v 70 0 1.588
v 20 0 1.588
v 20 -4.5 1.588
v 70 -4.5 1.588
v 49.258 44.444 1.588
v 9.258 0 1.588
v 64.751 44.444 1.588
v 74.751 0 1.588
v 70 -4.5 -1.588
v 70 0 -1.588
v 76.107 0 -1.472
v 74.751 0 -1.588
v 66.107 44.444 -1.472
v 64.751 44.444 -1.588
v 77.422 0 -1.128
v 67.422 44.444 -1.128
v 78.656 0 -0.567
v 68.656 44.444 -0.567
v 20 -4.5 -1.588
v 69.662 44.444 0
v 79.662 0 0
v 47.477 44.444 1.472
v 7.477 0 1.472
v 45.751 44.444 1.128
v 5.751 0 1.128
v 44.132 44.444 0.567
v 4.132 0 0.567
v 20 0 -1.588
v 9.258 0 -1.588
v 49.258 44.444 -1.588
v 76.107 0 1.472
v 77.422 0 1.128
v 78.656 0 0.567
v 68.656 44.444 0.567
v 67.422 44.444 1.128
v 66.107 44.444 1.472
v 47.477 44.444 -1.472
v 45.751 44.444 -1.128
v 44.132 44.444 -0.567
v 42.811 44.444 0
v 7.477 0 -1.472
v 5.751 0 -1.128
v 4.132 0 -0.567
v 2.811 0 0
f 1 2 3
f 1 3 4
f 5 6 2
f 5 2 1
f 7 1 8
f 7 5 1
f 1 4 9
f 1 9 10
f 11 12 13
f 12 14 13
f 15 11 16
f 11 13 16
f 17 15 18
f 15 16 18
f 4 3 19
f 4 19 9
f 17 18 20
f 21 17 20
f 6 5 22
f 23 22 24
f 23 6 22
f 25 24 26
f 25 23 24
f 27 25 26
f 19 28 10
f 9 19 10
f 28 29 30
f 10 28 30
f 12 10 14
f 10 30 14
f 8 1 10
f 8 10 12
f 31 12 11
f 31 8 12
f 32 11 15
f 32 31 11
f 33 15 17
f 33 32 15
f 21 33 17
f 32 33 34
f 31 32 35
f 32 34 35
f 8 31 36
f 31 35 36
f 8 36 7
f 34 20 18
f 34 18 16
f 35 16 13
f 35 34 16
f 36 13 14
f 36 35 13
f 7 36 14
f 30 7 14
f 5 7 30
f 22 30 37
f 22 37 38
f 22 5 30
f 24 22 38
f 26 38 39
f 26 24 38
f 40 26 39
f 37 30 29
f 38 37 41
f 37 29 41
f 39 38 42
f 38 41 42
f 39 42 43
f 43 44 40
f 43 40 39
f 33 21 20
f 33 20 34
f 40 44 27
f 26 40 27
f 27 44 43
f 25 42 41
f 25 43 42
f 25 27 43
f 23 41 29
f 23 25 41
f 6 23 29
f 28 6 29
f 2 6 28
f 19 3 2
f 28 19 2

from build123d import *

# Parameters (mm, degrees)
F0_W        = 50
F0_H        = 4.5
F1_DEPTH    = 1.5875
F2_T1_DEPTH = 84.8335063877
F3_T1_DEPTH = 61.4898569594
F4_R        = 7.62


# Not quite as in the source:
# - a fillet or chamfer that OpenCascade refuses, or shapes differently, is made with other operations: its cross-section is extruded or revolved along the edge and cut away or added


with BuildPart() as f1:
    # F0 (on Top) → F1 (new body, symmetric)
    with BuildSketch(Plane.XY):
        Polygon((40, 44.444437807), (0, 0), (20, 0), (70, 0), (80, 0), (70, 44.444437807), align=None)
        with Locations((45, -2.25)):
            Rectangle(F0_W, F0_H)
    extrude(amount=F1_DEPTH, both=True)

    # F2: chamfer of 2.794 x 4.8393499563 on 2 edges, made by hand

    # F2_s2 → F2_t1 (cut)
    with BuildSketch(Plane(origin=(48.3753142579, 53.7503411482, 0), x_dir=(0, 0, 1), z_dir=(-0.6689647868, -0.7432940966, 0))):
        Polygon((1.2065, 0), (-1.5875, -4.8393499563), (-1.5875, 0), align=None)
        Polygon((-1.2065, 0), (1.5875, -4.8393499563), (1.5875, 0), align=None)
    extrude(amount=F2_T1_DEPTH, mode=Mode.SUBTRACT)

    # F3: chamfer of 1.778 x 3.0795863359 on 2 edges, made by hand

    # F3_s2 → F3_t1 (cut)
    with BuildSketch(Plane(origin=(5.6037370993, -24.9054944995, 0), x_dir=(0, 0, 1), z_dir=(-0.2195122263, 0.9756097491, 0))):
        Polygon((-1.5875, 74.9691935903), (0.1905, 78.0487799262), (-1.5875, 78.0487799262), align=None)
        Polygon((-0.1905, 78.0487799262), (1.5875, 74.9691935903), (1.5875, 78.0487799262), align=None)
    extrude(amount=F3_T1_DEPTH, mode=Mode.SUBTRACT)

    # F4
    f4_edges = [f1.edges().sort_by_distance(p)[0] for p in [
        (26.51068, 22.222219, -1.5875),
        (71.843424, 22.222219, -1.5875),
        (71.843424, 22.222219, 1.5875),
        (26.51068, 22.222219, 1.5875),
    ]]
    fillet(f4_edges, radius=F4_R)


solid = f1.part
